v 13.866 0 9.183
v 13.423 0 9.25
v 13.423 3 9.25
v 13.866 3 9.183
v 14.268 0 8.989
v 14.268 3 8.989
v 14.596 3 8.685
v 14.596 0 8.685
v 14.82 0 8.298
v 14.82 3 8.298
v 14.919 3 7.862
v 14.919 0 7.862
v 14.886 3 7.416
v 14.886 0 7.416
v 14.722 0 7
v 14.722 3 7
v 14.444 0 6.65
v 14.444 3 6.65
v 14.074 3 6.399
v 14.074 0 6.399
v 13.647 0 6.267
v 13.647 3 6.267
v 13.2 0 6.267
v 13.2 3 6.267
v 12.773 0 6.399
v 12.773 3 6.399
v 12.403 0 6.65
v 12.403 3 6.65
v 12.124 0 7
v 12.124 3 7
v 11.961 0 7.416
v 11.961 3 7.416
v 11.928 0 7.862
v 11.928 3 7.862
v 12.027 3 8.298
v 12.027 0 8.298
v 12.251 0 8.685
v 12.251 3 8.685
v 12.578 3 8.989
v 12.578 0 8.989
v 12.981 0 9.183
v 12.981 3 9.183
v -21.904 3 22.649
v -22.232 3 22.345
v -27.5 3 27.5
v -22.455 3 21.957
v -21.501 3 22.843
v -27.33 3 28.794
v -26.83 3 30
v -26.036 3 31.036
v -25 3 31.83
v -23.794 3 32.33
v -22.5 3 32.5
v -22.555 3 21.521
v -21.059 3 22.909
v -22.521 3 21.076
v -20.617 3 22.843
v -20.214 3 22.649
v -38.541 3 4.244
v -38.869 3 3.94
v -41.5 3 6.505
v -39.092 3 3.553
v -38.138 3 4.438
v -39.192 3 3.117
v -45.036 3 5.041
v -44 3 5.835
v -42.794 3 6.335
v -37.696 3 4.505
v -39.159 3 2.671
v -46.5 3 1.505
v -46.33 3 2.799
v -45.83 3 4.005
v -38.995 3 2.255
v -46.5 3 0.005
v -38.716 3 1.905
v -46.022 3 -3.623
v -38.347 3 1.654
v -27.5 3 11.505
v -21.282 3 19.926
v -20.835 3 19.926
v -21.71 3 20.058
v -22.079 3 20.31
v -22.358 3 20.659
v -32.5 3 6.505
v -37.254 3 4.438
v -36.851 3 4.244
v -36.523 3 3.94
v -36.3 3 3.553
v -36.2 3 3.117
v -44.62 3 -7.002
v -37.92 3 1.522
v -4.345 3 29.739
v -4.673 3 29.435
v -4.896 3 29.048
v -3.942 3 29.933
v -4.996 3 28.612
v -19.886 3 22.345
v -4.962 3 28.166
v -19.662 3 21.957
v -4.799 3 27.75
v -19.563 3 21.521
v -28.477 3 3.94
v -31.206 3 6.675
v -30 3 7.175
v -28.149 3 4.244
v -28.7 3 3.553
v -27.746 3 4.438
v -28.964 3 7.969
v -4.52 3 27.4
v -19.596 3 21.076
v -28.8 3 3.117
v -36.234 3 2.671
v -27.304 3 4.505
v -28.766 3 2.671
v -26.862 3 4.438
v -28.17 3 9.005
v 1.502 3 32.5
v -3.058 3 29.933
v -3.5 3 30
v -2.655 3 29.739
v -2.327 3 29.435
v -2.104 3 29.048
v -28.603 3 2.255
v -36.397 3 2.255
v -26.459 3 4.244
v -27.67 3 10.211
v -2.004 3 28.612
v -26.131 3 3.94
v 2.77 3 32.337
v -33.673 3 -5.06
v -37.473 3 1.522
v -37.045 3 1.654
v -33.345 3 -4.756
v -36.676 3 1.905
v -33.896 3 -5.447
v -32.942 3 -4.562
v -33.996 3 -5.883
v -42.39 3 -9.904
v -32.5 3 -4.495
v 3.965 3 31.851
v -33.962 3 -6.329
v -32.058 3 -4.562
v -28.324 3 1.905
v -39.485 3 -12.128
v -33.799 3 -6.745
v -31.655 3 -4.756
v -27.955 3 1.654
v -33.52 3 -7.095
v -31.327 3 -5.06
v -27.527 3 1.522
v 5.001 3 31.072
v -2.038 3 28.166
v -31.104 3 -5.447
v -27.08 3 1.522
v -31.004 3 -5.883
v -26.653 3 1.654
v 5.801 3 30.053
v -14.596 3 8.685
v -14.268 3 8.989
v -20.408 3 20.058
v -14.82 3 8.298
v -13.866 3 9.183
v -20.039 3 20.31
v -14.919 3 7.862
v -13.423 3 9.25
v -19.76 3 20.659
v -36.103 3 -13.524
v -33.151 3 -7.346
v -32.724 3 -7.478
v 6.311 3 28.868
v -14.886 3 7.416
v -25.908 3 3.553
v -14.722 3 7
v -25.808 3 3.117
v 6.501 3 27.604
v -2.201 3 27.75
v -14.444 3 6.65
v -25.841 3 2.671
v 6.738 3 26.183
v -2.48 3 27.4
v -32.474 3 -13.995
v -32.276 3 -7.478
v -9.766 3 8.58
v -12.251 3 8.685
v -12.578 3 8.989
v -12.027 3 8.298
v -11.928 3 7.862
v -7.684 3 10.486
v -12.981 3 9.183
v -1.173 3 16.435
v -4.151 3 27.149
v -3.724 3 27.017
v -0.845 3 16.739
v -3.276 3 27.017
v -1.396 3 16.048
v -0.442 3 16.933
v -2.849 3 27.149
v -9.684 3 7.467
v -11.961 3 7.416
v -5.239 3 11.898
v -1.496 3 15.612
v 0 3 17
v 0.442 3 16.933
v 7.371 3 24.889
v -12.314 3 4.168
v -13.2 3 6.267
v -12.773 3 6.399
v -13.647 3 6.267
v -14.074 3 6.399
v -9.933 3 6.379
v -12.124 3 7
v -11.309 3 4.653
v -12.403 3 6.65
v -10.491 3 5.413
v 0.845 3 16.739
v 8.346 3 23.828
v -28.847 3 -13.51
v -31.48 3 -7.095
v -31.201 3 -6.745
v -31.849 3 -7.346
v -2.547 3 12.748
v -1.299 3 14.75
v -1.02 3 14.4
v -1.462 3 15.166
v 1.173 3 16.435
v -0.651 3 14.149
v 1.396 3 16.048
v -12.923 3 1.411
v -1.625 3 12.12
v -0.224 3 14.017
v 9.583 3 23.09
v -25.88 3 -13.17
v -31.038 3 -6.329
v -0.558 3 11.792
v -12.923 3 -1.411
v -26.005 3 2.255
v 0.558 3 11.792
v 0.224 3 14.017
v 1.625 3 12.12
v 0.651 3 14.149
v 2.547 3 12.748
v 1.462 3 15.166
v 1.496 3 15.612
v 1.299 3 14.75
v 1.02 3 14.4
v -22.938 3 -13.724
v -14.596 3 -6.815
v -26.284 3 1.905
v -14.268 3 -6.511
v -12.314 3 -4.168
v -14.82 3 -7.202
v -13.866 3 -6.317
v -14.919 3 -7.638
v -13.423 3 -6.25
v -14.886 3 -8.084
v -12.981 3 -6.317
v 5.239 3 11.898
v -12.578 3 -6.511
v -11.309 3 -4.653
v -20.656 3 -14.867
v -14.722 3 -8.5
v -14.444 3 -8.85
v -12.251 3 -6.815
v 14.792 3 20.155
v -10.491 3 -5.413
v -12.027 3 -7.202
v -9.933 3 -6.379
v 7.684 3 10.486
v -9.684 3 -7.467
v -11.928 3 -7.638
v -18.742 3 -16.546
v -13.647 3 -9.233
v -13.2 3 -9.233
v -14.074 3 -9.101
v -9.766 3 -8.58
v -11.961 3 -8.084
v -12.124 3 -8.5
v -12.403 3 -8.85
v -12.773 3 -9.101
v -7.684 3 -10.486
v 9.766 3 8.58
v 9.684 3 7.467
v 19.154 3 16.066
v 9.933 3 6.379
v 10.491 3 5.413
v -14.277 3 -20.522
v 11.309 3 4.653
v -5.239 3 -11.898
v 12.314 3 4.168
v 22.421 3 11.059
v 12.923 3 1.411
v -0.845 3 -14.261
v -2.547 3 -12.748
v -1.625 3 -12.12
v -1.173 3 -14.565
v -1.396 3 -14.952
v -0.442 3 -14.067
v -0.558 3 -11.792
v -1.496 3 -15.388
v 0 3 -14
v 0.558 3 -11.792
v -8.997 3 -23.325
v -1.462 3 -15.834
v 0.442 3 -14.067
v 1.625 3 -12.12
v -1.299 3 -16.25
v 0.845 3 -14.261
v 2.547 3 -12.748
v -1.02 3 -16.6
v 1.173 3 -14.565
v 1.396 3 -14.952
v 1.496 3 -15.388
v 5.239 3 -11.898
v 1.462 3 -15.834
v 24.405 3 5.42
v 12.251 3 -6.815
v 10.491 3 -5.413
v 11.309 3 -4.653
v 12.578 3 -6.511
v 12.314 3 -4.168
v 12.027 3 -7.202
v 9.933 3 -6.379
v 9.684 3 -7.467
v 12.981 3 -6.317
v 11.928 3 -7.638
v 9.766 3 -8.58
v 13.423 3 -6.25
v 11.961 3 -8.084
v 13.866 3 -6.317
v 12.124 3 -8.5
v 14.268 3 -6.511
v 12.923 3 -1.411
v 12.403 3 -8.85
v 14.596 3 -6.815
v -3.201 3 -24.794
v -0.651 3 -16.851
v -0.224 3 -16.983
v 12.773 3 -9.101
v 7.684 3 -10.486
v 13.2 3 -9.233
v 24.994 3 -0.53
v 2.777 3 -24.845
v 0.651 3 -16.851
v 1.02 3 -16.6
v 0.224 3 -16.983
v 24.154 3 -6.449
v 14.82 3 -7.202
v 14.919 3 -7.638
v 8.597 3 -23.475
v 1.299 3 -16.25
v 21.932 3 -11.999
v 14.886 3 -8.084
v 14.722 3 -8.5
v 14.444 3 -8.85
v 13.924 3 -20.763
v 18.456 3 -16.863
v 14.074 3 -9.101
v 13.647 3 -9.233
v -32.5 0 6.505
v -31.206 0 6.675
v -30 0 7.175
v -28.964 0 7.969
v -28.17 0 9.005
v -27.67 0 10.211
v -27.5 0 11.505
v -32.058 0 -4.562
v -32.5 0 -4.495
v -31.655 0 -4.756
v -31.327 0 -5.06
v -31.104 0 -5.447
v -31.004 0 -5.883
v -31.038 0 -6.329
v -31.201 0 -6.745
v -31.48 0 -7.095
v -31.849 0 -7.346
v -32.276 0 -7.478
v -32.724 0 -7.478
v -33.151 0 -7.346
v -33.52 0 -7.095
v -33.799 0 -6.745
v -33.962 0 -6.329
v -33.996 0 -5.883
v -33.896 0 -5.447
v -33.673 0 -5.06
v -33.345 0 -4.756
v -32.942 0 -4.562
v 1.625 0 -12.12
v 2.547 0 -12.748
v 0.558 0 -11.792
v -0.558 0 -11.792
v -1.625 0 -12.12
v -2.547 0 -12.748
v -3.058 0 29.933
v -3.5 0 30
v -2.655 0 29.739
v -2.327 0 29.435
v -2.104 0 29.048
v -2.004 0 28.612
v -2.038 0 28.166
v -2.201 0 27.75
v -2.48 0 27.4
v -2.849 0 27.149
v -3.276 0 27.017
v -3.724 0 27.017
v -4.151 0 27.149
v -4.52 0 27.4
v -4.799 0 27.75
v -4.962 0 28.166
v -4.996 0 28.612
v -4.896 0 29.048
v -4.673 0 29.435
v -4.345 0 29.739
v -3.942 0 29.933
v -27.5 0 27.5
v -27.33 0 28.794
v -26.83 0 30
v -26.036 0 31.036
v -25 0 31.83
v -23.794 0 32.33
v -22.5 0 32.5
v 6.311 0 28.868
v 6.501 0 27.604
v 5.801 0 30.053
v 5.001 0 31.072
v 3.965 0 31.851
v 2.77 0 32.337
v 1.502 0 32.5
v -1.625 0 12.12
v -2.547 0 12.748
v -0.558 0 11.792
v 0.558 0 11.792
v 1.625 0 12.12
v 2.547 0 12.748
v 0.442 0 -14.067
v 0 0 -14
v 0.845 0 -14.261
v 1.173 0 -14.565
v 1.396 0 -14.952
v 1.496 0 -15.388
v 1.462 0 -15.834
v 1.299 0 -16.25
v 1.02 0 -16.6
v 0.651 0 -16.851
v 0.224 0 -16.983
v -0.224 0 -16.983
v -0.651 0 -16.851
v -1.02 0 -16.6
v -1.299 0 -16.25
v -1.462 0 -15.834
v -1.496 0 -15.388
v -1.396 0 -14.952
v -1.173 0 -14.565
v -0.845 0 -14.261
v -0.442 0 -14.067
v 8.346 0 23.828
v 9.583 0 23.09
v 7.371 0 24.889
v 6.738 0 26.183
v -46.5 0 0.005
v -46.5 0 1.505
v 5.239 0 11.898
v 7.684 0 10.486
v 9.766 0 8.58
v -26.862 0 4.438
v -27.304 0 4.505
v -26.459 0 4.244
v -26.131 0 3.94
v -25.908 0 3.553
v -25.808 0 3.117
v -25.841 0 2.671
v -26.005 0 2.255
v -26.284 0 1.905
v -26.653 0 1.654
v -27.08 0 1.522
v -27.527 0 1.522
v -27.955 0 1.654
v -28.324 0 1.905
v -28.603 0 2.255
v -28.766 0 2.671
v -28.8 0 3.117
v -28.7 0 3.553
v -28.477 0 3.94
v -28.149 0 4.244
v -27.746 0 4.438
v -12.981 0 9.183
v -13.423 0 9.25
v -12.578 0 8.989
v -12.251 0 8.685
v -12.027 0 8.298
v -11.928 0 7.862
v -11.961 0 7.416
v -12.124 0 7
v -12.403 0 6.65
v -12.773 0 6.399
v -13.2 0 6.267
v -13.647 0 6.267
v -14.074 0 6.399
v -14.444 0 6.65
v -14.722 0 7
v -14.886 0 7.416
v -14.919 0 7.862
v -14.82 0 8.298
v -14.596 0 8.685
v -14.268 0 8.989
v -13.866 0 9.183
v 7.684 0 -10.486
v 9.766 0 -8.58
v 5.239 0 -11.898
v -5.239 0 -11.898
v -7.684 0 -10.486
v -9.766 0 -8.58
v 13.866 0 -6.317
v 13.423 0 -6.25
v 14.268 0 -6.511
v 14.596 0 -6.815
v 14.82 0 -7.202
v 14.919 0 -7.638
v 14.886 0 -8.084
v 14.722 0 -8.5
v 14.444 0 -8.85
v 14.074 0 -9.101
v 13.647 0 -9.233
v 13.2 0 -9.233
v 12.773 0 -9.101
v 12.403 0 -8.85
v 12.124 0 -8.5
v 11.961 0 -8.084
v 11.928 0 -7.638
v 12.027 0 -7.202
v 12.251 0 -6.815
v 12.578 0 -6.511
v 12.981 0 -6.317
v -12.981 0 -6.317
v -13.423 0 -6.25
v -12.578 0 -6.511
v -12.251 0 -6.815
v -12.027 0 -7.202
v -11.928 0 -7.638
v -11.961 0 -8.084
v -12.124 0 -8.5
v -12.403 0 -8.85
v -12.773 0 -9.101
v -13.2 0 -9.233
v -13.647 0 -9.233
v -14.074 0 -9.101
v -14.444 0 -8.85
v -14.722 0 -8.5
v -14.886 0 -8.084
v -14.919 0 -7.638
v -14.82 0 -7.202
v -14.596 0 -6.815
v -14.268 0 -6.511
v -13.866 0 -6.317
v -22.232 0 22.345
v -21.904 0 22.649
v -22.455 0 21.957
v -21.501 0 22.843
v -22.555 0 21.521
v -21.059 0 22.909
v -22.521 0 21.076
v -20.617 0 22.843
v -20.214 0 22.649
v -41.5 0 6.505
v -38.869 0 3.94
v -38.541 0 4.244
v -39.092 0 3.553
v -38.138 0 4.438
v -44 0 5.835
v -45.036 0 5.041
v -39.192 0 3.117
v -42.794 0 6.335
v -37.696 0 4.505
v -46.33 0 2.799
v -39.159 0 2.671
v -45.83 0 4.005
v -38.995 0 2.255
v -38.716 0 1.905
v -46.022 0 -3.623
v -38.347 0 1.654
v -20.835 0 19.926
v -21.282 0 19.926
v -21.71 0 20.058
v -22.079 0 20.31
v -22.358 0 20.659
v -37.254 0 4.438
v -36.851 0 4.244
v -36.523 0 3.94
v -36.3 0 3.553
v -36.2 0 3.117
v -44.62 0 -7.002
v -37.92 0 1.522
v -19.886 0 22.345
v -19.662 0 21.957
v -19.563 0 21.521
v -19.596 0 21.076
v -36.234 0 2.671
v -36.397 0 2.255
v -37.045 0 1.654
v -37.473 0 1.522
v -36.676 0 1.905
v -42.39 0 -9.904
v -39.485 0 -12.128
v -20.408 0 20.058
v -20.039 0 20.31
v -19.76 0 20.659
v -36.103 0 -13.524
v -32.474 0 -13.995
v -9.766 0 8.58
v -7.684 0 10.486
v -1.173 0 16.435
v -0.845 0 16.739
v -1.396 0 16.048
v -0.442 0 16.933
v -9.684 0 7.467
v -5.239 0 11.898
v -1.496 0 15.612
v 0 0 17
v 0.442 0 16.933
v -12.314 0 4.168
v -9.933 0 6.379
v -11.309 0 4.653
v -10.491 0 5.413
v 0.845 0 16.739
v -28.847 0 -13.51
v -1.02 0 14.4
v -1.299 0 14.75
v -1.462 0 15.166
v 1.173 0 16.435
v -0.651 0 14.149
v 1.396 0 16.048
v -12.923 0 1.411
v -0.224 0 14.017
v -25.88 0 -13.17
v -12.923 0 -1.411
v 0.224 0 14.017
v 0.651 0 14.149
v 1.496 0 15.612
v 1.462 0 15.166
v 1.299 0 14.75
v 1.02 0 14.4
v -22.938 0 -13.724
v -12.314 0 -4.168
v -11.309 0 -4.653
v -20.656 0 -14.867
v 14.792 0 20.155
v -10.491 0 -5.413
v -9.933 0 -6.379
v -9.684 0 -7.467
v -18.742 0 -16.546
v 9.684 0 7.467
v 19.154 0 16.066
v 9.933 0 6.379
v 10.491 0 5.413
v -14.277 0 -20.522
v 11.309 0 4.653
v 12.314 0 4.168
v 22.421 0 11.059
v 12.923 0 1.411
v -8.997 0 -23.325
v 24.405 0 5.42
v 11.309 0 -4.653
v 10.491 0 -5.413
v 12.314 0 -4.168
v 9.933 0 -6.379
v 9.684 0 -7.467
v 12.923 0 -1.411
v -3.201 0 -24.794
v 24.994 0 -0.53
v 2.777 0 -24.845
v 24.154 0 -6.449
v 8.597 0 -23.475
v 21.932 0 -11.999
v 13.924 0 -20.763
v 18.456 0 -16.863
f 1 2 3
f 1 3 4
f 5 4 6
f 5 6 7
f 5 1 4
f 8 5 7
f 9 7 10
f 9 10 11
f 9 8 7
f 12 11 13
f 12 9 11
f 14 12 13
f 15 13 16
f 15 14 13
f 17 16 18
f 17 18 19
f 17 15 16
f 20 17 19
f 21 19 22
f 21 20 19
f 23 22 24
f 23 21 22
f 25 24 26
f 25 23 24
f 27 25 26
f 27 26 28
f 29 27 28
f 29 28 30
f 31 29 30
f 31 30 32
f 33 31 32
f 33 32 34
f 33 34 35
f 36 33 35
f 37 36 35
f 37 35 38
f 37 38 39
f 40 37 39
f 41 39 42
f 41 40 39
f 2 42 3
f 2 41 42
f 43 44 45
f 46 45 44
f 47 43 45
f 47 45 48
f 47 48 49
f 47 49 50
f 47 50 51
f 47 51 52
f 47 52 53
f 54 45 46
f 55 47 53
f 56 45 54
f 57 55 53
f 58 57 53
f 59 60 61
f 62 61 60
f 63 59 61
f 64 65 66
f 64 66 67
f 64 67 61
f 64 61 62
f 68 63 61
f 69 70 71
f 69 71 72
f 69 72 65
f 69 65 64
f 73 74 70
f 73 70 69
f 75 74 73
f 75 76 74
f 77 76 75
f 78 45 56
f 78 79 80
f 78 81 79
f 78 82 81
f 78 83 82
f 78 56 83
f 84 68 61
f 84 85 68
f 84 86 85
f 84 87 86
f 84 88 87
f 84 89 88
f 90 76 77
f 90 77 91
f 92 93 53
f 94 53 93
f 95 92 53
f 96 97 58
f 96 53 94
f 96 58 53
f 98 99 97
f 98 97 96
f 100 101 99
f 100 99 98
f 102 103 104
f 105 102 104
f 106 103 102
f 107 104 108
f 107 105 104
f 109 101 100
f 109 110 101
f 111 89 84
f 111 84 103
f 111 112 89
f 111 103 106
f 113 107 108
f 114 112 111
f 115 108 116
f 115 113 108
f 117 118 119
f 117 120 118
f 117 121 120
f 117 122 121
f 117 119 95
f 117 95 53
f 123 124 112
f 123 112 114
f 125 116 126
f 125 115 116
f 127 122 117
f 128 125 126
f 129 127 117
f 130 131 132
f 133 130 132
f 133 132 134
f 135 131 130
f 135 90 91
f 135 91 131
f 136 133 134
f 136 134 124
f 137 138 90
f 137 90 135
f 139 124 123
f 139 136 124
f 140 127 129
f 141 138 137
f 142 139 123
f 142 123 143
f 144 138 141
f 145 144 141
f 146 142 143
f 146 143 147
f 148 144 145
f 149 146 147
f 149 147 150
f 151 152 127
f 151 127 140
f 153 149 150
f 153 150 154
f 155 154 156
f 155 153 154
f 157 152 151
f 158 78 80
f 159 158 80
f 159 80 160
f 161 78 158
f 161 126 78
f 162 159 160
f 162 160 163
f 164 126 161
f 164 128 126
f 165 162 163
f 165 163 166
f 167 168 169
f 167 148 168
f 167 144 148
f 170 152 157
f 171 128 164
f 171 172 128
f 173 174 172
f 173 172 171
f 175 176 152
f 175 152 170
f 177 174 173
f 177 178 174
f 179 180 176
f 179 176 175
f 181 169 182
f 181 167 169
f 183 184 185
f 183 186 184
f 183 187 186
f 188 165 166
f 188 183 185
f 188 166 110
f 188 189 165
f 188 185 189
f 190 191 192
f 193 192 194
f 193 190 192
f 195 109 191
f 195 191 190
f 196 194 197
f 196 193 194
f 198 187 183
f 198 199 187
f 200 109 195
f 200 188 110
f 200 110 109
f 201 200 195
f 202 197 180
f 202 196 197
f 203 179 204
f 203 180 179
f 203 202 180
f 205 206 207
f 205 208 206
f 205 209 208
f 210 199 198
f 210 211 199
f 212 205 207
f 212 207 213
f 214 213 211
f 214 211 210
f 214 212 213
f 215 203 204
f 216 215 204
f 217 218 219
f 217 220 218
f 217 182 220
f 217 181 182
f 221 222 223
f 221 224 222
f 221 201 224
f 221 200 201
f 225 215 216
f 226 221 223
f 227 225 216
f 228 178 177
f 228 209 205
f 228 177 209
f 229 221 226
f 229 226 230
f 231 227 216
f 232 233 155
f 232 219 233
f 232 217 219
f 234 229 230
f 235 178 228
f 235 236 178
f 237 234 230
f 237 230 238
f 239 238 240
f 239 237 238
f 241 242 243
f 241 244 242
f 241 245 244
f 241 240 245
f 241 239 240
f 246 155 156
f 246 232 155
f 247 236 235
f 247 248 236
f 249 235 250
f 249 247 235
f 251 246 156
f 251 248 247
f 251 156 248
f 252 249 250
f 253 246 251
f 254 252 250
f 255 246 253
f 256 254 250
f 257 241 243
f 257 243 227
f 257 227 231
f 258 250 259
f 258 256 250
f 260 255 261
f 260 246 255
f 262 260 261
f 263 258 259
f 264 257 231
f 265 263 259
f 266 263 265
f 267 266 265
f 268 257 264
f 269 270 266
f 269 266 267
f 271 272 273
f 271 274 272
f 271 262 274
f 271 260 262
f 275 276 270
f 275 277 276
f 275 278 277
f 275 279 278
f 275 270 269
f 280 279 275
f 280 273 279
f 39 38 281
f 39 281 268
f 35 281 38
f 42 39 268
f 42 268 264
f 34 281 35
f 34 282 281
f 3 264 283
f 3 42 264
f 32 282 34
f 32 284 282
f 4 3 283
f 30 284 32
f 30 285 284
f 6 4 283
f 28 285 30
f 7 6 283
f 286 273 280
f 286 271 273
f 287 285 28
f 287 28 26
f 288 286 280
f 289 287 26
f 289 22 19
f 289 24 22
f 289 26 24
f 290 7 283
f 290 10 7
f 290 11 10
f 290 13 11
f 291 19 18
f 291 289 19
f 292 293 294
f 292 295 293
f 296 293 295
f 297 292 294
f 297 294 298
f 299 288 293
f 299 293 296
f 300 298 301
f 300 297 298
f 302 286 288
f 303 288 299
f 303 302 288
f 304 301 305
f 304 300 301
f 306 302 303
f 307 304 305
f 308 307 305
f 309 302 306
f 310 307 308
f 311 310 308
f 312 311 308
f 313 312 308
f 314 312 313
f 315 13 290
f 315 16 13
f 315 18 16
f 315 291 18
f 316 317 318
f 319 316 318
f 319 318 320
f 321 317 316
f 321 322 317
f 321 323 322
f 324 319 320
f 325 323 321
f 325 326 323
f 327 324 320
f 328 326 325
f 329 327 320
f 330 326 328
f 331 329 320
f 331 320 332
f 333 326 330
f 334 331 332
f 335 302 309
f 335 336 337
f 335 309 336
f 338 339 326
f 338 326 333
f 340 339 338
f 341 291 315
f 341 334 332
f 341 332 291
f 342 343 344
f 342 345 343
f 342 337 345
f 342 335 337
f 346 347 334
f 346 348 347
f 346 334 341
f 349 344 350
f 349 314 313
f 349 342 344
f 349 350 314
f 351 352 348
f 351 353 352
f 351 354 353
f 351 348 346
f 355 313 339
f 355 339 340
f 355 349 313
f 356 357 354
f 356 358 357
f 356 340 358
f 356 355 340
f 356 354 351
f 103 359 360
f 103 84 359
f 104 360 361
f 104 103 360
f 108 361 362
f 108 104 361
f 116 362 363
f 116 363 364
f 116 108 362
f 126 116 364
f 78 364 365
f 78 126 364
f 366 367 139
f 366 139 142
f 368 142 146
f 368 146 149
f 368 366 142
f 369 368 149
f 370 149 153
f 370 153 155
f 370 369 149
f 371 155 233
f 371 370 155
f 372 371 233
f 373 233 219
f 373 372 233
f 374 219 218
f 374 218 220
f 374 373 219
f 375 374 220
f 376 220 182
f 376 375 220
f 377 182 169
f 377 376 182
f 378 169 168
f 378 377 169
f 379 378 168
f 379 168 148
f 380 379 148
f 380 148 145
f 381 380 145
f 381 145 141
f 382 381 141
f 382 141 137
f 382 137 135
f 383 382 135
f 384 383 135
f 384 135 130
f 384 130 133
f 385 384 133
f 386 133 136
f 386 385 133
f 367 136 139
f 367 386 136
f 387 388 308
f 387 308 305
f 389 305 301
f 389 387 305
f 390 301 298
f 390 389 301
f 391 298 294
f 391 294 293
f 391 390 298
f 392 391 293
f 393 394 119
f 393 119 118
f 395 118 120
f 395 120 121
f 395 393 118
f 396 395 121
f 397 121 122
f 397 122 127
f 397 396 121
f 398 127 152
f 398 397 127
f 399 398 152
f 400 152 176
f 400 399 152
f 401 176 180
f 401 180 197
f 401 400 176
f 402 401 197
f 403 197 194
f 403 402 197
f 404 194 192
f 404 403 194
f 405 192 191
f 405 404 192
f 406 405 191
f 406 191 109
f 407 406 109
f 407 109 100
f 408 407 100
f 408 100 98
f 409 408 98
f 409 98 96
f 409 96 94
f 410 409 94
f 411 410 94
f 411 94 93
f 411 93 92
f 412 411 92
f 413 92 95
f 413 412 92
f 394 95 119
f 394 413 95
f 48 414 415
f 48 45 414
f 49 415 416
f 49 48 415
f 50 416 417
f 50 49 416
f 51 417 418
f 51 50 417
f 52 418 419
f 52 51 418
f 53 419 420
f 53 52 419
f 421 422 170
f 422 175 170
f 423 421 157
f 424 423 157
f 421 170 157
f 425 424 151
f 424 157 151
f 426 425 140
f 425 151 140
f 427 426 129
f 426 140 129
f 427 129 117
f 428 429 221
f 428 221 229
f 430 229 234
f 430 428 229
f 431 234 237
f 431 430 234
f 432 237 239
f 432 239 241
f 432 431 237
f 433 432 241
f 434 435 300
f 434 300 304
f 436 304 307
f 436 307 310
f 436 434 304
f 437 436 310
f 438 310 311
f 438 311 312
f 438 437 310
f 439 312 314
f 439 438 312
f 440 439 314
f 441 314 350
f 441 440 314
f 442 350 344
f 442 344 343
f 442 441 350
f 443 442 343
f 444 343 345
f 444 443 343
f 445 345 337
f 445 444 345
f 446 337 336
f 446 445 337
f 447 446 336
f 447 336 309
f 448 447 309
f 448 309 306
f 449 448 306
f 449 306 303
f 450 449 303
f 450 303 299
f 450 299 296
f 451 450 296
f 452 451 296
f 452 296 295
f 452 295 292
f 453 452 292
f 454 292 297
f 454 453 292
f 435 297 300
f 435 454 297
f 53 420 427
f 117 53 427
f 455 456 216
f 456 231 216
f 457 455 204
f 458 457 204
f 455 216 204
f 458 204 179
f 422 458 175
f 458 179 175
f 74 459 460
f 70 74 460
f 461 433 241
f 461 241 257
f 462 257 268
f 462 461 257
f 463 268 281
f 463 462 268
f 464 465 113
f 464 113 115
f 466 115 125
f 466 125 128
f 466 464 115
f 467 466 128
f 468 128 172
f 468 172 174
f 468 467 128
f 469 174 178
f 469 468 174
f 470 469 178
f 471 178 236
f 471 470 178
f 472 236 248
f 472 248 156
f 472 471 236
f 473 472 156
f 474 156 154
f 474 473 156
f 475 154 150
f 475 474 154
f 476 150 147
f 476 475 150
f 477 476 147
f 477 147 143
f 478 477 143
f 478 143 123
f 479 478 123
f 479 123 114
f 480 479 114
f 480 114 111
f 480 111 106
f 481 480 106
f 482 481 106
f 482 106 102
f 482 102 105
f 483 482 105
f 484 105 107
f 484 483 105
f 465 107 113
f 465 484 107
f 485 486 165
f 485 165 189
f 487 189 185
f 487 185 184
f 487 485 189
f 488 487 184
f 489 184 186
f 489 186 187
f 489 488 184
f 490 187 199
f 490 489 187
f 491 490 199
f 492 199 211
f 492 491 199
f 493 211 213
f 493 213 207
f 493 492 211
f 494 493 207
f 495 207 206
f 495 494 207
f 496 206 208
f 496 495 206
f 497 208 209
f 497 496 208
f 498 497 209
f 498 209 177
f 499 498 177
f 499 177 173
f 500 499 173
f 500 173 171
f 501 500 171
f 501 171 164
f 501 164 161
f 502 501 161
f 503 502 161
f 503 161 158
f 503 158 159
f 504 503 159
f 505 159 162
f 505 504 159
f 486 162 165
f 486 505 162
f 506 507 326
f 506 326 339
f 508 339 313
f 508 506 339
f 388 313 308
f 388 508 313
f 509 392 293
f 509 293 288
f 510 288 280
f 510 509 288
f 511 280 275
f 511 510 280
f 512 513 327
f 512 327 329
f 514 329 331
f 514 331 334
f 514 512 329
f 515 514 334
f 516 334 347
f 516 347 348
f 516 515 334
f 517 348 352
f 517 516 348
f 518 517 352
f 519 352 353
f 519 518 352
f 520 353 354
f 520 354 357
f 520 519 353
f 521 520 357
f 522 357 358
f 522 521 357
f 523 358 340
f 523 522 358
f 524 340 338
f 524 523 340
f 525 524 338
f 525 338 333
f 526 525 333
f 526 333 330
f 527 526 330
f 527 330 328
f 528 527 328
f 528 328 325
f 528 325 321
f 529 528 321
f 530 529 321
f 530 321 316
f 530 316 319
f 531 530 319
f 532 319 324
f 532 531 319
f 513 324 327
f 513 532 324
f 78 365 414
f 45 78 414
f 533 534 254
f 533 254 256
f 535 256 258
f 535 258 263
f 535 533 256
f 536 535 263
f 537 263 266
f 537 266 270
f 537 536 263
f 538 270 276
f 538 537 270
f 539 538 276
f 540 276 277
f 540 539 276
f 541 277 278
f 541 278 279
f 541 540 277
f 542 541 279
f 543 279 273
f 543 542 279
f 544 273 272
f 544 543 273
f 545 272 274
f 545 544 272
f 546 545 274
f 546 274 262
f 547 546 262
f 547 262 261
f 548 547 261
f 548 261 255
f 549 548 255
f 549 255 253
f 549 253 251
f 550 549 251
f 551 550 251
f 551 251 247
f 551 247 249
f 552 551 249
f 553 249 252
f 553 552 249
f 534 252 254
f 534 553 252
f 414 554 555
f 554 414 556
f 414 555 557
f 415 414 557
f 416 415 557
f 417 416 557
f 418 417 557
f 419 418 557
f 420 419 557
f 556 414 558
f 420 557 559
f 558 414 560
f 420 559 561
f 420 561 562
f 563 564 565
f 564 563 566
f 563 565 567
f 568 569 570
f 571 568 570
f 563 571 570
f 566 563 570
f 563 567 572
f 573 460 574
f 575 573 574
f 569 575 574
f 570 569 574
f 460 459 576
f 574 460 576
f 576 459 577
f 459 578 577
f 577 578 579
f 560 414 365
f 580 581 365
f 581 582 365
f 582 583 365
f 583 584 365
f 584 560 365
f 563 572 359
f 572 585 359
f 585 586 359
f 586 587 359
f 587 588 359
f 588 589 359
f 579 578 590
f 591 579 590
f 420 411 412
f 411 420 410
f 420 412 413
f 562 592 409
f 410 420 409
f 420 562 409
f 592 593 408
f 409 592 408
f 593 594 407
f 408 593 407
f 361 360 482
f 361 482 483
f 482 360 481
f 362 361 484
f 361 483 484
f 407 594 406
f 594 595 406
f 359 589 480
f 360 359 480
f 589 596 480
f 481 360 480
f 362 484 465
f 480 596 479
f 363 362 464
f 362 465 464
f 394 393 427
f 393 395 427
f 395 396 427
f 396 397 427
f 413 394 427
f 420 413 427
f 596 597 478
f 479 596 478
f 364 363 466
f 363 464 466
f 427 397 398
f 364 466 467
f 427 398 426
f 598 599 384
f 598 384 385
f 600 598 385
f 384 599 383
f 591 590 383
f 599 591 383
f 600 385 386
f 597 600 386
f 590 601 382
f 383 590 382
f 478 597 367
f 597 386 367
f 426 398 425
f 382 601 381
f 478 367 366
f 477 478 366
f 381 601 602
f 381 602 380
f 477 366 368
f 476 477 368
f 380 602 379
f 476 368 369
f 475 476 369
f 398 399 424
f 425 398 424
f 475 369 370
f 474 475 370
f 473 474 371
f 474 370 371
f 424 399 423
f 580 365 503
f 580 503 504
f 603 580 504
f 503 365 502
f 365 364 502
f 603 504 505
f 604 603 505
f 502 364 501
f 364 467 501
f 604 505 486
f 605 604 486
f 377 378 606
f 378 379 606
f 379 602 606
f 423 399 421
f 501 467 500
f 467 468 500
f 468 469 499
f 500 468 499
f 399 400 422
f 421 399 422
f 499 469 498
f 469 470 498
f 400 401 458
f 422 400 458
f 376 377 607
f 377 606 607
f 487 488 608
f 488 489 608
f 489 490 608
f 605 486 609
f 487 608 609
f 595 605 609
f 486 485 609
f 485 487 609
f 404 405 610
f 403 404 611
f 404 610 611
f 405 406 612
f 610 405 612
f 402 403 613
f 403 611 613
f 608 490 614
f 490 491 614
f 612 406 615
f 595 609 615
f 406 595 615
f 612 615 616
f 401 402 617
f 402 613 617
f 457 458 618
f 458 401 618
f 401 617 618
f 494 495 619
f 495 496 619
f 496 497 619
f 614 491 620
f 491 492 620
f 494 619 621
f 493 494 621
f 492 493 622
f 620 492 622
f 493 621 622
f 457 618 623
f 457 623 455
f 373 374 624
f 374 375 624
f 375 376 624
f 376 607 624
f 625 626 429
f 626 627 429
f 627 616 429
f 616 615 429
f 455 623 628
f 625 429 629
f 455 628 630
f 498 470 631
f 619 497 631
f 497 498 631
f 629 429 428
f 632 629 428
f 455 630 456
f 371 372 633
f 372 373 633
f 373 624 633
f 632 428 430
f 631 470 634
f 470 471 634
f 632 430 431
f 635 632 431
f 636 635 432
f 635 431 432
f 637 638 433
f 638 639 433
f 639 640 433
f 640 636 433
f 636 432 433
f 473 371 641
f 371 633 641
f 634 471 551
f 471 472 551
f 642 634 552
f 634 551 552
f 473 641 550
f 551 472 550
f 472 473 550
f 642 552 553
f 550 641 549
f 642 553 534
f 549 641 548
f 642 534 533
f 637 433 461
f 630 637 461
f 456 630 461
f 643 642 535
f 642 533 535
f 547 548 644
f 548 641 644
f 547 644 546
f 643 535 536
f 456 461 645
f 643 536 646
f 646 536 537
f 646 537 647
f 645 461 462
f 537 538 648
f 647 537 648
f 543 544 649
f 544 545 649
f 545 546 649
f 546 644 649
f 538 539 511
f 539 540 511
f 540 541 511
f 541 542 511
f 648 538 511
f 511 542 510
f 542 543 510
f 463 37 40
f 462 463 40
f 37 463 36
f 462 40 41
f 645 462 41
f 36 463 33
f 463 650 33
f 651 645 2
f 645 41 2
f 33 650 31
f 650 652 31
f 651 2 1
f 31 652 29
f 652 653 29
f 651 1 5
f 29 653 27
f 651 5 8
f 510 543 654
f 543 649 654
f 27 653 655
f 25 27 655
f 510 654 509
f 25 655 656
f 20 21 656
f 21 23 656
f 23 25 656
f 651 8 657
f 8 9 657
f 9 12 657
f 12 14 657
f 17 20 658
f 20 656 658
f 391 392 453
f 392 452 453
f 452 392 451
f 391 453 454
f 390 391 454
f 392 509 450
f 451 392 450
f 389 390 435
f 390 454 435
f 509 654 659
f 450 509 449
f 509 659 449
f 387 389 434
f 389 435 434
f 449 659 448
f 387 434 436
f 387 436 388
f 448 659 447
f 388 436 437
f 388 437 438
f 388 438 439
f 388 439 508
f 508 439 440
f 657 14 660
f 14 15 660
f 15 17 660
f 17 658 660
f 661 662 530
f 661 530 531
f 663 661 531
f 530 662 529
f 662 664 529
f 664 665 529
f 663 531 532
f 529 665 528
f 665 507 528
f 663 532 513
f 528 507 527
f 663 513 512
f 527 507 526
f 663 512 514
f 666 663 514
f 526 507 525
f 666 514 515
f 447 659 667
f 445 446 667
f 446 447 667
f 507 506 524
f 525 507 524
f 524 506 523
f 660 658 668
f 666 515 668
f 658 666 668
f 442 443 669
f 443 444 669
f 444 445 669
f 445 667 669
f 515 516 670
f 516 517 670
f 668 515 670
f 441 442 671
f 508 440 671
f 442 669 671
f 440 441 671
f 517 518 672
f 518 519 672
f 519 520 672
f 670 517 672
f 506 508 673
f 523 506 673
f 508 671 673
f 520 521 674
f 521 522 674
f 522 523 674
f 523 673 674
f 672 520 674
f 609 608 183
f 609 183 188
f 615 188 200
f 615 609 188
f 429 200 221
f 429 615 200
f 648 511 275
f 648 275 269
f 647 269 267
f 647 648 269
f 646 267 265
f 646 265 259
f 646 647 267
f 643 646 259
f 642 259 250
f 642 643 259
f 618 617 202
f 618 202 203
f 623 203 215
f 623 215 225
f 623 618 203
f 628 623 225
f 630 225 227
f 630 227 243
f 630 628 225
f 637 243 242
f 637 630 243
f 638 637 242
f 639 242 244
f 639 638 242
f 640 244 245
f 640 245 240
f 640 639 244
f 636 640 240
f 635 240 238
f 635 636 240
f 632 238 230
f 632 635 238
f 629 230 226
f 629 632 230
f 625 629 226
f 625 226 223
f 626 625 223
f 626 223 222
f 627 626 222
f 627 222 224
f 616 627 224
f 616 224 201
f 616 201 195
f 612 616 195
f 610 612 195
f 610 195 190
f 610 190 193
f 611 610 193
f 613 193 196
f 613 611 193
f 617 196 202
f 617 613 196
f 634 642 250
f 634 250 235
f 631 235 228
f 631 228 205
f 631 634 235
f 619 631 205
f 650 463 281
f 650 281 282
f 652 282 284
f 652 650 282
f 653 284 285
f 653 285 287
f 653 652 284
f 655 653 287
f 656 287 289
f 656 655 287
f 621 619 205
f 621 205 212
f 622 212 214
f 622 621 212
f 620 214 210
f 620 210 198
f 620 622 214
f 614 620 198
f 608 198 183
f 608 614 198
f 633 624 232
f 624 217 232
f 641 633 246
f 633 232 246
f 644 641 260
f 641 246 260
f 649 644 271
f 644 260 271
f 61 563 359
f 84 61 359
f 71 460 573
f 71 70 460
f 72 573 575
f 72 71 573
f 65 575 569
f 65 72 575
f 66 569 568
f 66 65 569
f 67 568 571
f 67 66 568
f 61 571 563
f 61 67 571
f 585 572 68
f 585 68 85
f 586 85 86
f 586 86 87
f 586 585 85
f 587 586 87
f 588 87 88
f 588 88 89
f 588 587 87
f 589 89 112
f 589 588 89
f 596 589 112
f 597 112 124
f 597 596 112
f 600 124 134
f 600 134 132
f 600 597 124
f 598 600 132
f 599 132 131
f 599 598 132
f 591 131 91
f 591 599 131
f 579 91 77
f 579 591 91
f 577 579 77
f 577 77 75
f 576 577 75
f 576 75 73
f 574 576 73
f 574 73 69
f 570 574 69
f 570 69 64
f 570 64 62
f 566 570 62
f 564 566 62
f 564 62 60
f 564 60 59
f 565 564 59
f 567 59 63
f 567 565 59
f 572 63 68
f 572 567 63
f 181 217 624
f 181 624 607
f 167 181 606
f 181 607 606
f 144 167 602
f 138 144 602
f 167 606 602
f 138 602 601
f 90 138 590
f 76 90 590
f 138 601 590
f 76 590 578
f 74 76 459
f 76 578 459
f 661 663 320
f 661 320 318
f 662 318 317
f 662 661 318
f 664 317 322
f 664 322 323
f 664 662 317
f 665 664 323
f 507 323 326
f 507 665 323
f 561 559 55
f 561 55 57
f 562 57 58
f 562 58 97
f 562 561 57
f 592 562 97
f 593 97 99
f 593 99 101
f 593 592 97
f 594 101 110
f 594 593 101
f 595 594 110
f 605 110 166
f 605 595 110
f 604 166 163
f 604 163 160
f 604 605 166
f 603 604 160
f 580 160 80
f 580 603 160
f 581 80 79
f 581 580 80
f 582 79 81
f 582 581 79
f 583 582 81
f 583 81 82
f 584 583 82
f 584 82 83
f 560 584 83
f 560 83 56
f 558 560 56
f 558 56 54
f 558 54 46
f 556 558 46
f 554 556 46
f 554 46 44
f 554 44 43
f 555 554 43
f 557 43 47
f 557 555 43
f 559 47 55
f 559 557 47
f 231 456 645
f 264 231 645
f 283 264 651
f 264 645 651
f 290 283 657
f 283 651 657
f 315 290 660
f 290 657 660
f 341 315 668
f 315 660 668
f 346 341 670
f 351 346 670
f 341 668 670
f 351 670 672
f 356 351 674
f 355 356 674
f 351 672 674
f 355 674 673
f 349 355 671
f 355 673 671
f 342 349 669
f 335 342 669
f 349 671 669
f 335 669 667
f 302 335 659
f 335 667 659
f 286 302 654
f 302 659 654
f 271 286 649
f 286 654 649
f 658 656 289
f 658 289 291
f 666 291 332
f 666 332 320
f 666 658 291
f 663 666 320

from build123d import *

# Parameters (mm, degrees)
SKETCH_1_R      = 1.5
EXTRUDE_1_DEPTH = 3
FILLET_1_R      = 5
FILLET_2_R      = 10
FILLET_6_R      = 5
FILLET_7_R      = 5


with BuildPart() as part:
    # 草图1 → 凸台-拉伸1 (new body)
    with BuildSketch(Plane(origin=(0, 0, 0), x_dir=(1, 0, 0), z_dir=(0, 1, 0))):
        with BuildLine():
            Line((-46.499999325, -0.004997817), (-46.499999325, -6.504997817))
            Line((-46.499999325, -6.504997817), (-27.499999325, -6.504997817))
            Line((-27.499999325, -6.504997817), (-27.499999325, -32.5))
            Line((-27.499999325, -32.5), (6.5, -32.5))
            Line((6.5, -32.5), (6.5, -24.140215409))
            ThreePointArc((6.5, -24.140215409), (18.98987541, 16.25990873), (-22.851559401, 10.139340853))
            ThreePointArc((-22.851559401, 10.139340853), (-38.019140611, 12.86120129), (-46.499999325, -0.004997817))
        make_face()
        with Locations(Location((-32.499999325, 5.995002183, 0), (0, 0, 270))):
            Circle(SKETCH_1_R, mode=Mode.SUBTRACT)
        with Locations(Location((-27.303846902, -3.004997817, 0), (0, 0, 270))):
            Circle(SKETCH_1_R, mode=Mode.SUBTRACT)
        with Locations(Location((-3.5, -28.5, 0), (0, 0, 270))):
            Circle(SKETCH_1_R, mode=Mode.SUBTRACT)
        with Locations(Location((-37.696151748, -3.004997817, 0), (0, 0, 270))):
            Circle(SKETCH_1_R, mode=Mode.SUBTRACT)
        with Locations(Location((-21.058777701, -21.409353158, 0), (0, 0, 270))):
            Circle(SKETCH_1_R, mode=Mode.SUBTRACT)
        with Locations(Location((0, 15.5, 0), (0, 0, 270))):
            Circle(SKETCH_1_R, mode=Mode.SUBTRACT)
        with Locations(Location((13.423393759, 7.75, 0), (0, 0, 270))):
            Circle(SKETCH_1_R, mode=Mode.SUBTRACT)
        with Locations(Location((13.423393759, -7.75, 0), (0, 0, 270))):
            Circle(SKETCH_1_R, mode=Mode.SUBTRACT)
        with Locations(Location((0, -15.5, 0), (0, 0, 270))):
            Circle(SKETCH_1_R, mode=Mode.SUBTRACT)
        with Locations(Location((-13.423393759, -7.75, 0), (0, 0, 270))):
            Circle(SKETCH_1_R, mode=Mode.SUBTRACT)
        with Locations(Location((-13.423393759, 7.75, 0), (0, 0, 270))):
            Circle(SKETCH_1_R, mode=Mode.SUBTRACT)
        with BuildLine():
            ThreePointArc((-12.313744557, 4.167936537), (-13, 0), (-12.313744557, -4.167936537))
            ThreePointArc((-12.313744557, -4.167936537), (-10.175798494, -5.875), (-9.766411201, -8.580047334))
            ThreePointArc((-9.766411201, -8.580047334), (-6.5, -11.258330249), (-2.547333356, -12.747983871))
            ThreePointArc((-2.547333356, -12.747983871), (0, -11.75), (2.547333356, -12.747983871))
            ThreePointArc((2.547333356, -12.747983871), (6.5, -11.258330249), (9.766411201, -8.580047334))
            ThreePointArc((9.766411201, -8.580047334), (10.175798494, -5.875), (12.313744557, -4.167936537))
            ThreePointArc((12.313744557, -4.167936537), (13, 0), (12.313744557, 4.167936537))
            ThreePointArc((12.313744557, 4.167936537), (10.175798494, 5.875), (9.766411201, 8.580047334))
            ThreePointArc((9.766411201, 8.580047334), (6.5, 11.258330249), (2.547333356, 12.747983871))
            ThreePointArc((2.547333356, 12.747983871), (0, 11.75), (-2.547333356, 12.747983871))
            ThreePointArc((-2.547333356, 12.747983871), (-6.5, 11.258330249), (-9.766411201, 8.580047334))
            ThreePointArc((-9.766411201, 8.580047334), (-10.175798494, 5.875), (-12.313744557, 4.167936537))
        make_face(mode=Mode.SUBTRACT)
    extrude(amount=EXTRUDE_1_DEPTH)

    # 圆角1
    fillet_1_edges = [part.edges().sort_by_distance(p)[0] for p in [
        (-27.499999325, 1.5, 32.5),
        (-27.499999325, 1.5, 6.504997817),
        (-46.499999325, 1.5, 6.504997817),
    ]]
    fillet(fillet_1_edges, radius=FILLET_1_R)

    # 圆角2
    fillet_2_edges = [part.edges().sort_by_distance(p)[0] for p in [
        (-22.851559401, 1.5, -10.139340853),
    ]]
    fillet(fillet_2_edges, radius=FILLET_2_R)

    # 圆角6
    fillet_6_edges = [part.edges().sort_by_distance(p)[0] for p in [
        (6.5, 1.5, 24.140215409),
    ]]
    fillet(fillet_6_edges, radius=FILLET_6_R)

    # 圆角7
    fillet_7_edges = [part.edges().sort_by_distance(p)[0] for p in [
        (6.5, 1.5, 32.5),
    ]]
    fillet(fillet_7_edges, radius=FILLET_7_R)


solid = part.part
